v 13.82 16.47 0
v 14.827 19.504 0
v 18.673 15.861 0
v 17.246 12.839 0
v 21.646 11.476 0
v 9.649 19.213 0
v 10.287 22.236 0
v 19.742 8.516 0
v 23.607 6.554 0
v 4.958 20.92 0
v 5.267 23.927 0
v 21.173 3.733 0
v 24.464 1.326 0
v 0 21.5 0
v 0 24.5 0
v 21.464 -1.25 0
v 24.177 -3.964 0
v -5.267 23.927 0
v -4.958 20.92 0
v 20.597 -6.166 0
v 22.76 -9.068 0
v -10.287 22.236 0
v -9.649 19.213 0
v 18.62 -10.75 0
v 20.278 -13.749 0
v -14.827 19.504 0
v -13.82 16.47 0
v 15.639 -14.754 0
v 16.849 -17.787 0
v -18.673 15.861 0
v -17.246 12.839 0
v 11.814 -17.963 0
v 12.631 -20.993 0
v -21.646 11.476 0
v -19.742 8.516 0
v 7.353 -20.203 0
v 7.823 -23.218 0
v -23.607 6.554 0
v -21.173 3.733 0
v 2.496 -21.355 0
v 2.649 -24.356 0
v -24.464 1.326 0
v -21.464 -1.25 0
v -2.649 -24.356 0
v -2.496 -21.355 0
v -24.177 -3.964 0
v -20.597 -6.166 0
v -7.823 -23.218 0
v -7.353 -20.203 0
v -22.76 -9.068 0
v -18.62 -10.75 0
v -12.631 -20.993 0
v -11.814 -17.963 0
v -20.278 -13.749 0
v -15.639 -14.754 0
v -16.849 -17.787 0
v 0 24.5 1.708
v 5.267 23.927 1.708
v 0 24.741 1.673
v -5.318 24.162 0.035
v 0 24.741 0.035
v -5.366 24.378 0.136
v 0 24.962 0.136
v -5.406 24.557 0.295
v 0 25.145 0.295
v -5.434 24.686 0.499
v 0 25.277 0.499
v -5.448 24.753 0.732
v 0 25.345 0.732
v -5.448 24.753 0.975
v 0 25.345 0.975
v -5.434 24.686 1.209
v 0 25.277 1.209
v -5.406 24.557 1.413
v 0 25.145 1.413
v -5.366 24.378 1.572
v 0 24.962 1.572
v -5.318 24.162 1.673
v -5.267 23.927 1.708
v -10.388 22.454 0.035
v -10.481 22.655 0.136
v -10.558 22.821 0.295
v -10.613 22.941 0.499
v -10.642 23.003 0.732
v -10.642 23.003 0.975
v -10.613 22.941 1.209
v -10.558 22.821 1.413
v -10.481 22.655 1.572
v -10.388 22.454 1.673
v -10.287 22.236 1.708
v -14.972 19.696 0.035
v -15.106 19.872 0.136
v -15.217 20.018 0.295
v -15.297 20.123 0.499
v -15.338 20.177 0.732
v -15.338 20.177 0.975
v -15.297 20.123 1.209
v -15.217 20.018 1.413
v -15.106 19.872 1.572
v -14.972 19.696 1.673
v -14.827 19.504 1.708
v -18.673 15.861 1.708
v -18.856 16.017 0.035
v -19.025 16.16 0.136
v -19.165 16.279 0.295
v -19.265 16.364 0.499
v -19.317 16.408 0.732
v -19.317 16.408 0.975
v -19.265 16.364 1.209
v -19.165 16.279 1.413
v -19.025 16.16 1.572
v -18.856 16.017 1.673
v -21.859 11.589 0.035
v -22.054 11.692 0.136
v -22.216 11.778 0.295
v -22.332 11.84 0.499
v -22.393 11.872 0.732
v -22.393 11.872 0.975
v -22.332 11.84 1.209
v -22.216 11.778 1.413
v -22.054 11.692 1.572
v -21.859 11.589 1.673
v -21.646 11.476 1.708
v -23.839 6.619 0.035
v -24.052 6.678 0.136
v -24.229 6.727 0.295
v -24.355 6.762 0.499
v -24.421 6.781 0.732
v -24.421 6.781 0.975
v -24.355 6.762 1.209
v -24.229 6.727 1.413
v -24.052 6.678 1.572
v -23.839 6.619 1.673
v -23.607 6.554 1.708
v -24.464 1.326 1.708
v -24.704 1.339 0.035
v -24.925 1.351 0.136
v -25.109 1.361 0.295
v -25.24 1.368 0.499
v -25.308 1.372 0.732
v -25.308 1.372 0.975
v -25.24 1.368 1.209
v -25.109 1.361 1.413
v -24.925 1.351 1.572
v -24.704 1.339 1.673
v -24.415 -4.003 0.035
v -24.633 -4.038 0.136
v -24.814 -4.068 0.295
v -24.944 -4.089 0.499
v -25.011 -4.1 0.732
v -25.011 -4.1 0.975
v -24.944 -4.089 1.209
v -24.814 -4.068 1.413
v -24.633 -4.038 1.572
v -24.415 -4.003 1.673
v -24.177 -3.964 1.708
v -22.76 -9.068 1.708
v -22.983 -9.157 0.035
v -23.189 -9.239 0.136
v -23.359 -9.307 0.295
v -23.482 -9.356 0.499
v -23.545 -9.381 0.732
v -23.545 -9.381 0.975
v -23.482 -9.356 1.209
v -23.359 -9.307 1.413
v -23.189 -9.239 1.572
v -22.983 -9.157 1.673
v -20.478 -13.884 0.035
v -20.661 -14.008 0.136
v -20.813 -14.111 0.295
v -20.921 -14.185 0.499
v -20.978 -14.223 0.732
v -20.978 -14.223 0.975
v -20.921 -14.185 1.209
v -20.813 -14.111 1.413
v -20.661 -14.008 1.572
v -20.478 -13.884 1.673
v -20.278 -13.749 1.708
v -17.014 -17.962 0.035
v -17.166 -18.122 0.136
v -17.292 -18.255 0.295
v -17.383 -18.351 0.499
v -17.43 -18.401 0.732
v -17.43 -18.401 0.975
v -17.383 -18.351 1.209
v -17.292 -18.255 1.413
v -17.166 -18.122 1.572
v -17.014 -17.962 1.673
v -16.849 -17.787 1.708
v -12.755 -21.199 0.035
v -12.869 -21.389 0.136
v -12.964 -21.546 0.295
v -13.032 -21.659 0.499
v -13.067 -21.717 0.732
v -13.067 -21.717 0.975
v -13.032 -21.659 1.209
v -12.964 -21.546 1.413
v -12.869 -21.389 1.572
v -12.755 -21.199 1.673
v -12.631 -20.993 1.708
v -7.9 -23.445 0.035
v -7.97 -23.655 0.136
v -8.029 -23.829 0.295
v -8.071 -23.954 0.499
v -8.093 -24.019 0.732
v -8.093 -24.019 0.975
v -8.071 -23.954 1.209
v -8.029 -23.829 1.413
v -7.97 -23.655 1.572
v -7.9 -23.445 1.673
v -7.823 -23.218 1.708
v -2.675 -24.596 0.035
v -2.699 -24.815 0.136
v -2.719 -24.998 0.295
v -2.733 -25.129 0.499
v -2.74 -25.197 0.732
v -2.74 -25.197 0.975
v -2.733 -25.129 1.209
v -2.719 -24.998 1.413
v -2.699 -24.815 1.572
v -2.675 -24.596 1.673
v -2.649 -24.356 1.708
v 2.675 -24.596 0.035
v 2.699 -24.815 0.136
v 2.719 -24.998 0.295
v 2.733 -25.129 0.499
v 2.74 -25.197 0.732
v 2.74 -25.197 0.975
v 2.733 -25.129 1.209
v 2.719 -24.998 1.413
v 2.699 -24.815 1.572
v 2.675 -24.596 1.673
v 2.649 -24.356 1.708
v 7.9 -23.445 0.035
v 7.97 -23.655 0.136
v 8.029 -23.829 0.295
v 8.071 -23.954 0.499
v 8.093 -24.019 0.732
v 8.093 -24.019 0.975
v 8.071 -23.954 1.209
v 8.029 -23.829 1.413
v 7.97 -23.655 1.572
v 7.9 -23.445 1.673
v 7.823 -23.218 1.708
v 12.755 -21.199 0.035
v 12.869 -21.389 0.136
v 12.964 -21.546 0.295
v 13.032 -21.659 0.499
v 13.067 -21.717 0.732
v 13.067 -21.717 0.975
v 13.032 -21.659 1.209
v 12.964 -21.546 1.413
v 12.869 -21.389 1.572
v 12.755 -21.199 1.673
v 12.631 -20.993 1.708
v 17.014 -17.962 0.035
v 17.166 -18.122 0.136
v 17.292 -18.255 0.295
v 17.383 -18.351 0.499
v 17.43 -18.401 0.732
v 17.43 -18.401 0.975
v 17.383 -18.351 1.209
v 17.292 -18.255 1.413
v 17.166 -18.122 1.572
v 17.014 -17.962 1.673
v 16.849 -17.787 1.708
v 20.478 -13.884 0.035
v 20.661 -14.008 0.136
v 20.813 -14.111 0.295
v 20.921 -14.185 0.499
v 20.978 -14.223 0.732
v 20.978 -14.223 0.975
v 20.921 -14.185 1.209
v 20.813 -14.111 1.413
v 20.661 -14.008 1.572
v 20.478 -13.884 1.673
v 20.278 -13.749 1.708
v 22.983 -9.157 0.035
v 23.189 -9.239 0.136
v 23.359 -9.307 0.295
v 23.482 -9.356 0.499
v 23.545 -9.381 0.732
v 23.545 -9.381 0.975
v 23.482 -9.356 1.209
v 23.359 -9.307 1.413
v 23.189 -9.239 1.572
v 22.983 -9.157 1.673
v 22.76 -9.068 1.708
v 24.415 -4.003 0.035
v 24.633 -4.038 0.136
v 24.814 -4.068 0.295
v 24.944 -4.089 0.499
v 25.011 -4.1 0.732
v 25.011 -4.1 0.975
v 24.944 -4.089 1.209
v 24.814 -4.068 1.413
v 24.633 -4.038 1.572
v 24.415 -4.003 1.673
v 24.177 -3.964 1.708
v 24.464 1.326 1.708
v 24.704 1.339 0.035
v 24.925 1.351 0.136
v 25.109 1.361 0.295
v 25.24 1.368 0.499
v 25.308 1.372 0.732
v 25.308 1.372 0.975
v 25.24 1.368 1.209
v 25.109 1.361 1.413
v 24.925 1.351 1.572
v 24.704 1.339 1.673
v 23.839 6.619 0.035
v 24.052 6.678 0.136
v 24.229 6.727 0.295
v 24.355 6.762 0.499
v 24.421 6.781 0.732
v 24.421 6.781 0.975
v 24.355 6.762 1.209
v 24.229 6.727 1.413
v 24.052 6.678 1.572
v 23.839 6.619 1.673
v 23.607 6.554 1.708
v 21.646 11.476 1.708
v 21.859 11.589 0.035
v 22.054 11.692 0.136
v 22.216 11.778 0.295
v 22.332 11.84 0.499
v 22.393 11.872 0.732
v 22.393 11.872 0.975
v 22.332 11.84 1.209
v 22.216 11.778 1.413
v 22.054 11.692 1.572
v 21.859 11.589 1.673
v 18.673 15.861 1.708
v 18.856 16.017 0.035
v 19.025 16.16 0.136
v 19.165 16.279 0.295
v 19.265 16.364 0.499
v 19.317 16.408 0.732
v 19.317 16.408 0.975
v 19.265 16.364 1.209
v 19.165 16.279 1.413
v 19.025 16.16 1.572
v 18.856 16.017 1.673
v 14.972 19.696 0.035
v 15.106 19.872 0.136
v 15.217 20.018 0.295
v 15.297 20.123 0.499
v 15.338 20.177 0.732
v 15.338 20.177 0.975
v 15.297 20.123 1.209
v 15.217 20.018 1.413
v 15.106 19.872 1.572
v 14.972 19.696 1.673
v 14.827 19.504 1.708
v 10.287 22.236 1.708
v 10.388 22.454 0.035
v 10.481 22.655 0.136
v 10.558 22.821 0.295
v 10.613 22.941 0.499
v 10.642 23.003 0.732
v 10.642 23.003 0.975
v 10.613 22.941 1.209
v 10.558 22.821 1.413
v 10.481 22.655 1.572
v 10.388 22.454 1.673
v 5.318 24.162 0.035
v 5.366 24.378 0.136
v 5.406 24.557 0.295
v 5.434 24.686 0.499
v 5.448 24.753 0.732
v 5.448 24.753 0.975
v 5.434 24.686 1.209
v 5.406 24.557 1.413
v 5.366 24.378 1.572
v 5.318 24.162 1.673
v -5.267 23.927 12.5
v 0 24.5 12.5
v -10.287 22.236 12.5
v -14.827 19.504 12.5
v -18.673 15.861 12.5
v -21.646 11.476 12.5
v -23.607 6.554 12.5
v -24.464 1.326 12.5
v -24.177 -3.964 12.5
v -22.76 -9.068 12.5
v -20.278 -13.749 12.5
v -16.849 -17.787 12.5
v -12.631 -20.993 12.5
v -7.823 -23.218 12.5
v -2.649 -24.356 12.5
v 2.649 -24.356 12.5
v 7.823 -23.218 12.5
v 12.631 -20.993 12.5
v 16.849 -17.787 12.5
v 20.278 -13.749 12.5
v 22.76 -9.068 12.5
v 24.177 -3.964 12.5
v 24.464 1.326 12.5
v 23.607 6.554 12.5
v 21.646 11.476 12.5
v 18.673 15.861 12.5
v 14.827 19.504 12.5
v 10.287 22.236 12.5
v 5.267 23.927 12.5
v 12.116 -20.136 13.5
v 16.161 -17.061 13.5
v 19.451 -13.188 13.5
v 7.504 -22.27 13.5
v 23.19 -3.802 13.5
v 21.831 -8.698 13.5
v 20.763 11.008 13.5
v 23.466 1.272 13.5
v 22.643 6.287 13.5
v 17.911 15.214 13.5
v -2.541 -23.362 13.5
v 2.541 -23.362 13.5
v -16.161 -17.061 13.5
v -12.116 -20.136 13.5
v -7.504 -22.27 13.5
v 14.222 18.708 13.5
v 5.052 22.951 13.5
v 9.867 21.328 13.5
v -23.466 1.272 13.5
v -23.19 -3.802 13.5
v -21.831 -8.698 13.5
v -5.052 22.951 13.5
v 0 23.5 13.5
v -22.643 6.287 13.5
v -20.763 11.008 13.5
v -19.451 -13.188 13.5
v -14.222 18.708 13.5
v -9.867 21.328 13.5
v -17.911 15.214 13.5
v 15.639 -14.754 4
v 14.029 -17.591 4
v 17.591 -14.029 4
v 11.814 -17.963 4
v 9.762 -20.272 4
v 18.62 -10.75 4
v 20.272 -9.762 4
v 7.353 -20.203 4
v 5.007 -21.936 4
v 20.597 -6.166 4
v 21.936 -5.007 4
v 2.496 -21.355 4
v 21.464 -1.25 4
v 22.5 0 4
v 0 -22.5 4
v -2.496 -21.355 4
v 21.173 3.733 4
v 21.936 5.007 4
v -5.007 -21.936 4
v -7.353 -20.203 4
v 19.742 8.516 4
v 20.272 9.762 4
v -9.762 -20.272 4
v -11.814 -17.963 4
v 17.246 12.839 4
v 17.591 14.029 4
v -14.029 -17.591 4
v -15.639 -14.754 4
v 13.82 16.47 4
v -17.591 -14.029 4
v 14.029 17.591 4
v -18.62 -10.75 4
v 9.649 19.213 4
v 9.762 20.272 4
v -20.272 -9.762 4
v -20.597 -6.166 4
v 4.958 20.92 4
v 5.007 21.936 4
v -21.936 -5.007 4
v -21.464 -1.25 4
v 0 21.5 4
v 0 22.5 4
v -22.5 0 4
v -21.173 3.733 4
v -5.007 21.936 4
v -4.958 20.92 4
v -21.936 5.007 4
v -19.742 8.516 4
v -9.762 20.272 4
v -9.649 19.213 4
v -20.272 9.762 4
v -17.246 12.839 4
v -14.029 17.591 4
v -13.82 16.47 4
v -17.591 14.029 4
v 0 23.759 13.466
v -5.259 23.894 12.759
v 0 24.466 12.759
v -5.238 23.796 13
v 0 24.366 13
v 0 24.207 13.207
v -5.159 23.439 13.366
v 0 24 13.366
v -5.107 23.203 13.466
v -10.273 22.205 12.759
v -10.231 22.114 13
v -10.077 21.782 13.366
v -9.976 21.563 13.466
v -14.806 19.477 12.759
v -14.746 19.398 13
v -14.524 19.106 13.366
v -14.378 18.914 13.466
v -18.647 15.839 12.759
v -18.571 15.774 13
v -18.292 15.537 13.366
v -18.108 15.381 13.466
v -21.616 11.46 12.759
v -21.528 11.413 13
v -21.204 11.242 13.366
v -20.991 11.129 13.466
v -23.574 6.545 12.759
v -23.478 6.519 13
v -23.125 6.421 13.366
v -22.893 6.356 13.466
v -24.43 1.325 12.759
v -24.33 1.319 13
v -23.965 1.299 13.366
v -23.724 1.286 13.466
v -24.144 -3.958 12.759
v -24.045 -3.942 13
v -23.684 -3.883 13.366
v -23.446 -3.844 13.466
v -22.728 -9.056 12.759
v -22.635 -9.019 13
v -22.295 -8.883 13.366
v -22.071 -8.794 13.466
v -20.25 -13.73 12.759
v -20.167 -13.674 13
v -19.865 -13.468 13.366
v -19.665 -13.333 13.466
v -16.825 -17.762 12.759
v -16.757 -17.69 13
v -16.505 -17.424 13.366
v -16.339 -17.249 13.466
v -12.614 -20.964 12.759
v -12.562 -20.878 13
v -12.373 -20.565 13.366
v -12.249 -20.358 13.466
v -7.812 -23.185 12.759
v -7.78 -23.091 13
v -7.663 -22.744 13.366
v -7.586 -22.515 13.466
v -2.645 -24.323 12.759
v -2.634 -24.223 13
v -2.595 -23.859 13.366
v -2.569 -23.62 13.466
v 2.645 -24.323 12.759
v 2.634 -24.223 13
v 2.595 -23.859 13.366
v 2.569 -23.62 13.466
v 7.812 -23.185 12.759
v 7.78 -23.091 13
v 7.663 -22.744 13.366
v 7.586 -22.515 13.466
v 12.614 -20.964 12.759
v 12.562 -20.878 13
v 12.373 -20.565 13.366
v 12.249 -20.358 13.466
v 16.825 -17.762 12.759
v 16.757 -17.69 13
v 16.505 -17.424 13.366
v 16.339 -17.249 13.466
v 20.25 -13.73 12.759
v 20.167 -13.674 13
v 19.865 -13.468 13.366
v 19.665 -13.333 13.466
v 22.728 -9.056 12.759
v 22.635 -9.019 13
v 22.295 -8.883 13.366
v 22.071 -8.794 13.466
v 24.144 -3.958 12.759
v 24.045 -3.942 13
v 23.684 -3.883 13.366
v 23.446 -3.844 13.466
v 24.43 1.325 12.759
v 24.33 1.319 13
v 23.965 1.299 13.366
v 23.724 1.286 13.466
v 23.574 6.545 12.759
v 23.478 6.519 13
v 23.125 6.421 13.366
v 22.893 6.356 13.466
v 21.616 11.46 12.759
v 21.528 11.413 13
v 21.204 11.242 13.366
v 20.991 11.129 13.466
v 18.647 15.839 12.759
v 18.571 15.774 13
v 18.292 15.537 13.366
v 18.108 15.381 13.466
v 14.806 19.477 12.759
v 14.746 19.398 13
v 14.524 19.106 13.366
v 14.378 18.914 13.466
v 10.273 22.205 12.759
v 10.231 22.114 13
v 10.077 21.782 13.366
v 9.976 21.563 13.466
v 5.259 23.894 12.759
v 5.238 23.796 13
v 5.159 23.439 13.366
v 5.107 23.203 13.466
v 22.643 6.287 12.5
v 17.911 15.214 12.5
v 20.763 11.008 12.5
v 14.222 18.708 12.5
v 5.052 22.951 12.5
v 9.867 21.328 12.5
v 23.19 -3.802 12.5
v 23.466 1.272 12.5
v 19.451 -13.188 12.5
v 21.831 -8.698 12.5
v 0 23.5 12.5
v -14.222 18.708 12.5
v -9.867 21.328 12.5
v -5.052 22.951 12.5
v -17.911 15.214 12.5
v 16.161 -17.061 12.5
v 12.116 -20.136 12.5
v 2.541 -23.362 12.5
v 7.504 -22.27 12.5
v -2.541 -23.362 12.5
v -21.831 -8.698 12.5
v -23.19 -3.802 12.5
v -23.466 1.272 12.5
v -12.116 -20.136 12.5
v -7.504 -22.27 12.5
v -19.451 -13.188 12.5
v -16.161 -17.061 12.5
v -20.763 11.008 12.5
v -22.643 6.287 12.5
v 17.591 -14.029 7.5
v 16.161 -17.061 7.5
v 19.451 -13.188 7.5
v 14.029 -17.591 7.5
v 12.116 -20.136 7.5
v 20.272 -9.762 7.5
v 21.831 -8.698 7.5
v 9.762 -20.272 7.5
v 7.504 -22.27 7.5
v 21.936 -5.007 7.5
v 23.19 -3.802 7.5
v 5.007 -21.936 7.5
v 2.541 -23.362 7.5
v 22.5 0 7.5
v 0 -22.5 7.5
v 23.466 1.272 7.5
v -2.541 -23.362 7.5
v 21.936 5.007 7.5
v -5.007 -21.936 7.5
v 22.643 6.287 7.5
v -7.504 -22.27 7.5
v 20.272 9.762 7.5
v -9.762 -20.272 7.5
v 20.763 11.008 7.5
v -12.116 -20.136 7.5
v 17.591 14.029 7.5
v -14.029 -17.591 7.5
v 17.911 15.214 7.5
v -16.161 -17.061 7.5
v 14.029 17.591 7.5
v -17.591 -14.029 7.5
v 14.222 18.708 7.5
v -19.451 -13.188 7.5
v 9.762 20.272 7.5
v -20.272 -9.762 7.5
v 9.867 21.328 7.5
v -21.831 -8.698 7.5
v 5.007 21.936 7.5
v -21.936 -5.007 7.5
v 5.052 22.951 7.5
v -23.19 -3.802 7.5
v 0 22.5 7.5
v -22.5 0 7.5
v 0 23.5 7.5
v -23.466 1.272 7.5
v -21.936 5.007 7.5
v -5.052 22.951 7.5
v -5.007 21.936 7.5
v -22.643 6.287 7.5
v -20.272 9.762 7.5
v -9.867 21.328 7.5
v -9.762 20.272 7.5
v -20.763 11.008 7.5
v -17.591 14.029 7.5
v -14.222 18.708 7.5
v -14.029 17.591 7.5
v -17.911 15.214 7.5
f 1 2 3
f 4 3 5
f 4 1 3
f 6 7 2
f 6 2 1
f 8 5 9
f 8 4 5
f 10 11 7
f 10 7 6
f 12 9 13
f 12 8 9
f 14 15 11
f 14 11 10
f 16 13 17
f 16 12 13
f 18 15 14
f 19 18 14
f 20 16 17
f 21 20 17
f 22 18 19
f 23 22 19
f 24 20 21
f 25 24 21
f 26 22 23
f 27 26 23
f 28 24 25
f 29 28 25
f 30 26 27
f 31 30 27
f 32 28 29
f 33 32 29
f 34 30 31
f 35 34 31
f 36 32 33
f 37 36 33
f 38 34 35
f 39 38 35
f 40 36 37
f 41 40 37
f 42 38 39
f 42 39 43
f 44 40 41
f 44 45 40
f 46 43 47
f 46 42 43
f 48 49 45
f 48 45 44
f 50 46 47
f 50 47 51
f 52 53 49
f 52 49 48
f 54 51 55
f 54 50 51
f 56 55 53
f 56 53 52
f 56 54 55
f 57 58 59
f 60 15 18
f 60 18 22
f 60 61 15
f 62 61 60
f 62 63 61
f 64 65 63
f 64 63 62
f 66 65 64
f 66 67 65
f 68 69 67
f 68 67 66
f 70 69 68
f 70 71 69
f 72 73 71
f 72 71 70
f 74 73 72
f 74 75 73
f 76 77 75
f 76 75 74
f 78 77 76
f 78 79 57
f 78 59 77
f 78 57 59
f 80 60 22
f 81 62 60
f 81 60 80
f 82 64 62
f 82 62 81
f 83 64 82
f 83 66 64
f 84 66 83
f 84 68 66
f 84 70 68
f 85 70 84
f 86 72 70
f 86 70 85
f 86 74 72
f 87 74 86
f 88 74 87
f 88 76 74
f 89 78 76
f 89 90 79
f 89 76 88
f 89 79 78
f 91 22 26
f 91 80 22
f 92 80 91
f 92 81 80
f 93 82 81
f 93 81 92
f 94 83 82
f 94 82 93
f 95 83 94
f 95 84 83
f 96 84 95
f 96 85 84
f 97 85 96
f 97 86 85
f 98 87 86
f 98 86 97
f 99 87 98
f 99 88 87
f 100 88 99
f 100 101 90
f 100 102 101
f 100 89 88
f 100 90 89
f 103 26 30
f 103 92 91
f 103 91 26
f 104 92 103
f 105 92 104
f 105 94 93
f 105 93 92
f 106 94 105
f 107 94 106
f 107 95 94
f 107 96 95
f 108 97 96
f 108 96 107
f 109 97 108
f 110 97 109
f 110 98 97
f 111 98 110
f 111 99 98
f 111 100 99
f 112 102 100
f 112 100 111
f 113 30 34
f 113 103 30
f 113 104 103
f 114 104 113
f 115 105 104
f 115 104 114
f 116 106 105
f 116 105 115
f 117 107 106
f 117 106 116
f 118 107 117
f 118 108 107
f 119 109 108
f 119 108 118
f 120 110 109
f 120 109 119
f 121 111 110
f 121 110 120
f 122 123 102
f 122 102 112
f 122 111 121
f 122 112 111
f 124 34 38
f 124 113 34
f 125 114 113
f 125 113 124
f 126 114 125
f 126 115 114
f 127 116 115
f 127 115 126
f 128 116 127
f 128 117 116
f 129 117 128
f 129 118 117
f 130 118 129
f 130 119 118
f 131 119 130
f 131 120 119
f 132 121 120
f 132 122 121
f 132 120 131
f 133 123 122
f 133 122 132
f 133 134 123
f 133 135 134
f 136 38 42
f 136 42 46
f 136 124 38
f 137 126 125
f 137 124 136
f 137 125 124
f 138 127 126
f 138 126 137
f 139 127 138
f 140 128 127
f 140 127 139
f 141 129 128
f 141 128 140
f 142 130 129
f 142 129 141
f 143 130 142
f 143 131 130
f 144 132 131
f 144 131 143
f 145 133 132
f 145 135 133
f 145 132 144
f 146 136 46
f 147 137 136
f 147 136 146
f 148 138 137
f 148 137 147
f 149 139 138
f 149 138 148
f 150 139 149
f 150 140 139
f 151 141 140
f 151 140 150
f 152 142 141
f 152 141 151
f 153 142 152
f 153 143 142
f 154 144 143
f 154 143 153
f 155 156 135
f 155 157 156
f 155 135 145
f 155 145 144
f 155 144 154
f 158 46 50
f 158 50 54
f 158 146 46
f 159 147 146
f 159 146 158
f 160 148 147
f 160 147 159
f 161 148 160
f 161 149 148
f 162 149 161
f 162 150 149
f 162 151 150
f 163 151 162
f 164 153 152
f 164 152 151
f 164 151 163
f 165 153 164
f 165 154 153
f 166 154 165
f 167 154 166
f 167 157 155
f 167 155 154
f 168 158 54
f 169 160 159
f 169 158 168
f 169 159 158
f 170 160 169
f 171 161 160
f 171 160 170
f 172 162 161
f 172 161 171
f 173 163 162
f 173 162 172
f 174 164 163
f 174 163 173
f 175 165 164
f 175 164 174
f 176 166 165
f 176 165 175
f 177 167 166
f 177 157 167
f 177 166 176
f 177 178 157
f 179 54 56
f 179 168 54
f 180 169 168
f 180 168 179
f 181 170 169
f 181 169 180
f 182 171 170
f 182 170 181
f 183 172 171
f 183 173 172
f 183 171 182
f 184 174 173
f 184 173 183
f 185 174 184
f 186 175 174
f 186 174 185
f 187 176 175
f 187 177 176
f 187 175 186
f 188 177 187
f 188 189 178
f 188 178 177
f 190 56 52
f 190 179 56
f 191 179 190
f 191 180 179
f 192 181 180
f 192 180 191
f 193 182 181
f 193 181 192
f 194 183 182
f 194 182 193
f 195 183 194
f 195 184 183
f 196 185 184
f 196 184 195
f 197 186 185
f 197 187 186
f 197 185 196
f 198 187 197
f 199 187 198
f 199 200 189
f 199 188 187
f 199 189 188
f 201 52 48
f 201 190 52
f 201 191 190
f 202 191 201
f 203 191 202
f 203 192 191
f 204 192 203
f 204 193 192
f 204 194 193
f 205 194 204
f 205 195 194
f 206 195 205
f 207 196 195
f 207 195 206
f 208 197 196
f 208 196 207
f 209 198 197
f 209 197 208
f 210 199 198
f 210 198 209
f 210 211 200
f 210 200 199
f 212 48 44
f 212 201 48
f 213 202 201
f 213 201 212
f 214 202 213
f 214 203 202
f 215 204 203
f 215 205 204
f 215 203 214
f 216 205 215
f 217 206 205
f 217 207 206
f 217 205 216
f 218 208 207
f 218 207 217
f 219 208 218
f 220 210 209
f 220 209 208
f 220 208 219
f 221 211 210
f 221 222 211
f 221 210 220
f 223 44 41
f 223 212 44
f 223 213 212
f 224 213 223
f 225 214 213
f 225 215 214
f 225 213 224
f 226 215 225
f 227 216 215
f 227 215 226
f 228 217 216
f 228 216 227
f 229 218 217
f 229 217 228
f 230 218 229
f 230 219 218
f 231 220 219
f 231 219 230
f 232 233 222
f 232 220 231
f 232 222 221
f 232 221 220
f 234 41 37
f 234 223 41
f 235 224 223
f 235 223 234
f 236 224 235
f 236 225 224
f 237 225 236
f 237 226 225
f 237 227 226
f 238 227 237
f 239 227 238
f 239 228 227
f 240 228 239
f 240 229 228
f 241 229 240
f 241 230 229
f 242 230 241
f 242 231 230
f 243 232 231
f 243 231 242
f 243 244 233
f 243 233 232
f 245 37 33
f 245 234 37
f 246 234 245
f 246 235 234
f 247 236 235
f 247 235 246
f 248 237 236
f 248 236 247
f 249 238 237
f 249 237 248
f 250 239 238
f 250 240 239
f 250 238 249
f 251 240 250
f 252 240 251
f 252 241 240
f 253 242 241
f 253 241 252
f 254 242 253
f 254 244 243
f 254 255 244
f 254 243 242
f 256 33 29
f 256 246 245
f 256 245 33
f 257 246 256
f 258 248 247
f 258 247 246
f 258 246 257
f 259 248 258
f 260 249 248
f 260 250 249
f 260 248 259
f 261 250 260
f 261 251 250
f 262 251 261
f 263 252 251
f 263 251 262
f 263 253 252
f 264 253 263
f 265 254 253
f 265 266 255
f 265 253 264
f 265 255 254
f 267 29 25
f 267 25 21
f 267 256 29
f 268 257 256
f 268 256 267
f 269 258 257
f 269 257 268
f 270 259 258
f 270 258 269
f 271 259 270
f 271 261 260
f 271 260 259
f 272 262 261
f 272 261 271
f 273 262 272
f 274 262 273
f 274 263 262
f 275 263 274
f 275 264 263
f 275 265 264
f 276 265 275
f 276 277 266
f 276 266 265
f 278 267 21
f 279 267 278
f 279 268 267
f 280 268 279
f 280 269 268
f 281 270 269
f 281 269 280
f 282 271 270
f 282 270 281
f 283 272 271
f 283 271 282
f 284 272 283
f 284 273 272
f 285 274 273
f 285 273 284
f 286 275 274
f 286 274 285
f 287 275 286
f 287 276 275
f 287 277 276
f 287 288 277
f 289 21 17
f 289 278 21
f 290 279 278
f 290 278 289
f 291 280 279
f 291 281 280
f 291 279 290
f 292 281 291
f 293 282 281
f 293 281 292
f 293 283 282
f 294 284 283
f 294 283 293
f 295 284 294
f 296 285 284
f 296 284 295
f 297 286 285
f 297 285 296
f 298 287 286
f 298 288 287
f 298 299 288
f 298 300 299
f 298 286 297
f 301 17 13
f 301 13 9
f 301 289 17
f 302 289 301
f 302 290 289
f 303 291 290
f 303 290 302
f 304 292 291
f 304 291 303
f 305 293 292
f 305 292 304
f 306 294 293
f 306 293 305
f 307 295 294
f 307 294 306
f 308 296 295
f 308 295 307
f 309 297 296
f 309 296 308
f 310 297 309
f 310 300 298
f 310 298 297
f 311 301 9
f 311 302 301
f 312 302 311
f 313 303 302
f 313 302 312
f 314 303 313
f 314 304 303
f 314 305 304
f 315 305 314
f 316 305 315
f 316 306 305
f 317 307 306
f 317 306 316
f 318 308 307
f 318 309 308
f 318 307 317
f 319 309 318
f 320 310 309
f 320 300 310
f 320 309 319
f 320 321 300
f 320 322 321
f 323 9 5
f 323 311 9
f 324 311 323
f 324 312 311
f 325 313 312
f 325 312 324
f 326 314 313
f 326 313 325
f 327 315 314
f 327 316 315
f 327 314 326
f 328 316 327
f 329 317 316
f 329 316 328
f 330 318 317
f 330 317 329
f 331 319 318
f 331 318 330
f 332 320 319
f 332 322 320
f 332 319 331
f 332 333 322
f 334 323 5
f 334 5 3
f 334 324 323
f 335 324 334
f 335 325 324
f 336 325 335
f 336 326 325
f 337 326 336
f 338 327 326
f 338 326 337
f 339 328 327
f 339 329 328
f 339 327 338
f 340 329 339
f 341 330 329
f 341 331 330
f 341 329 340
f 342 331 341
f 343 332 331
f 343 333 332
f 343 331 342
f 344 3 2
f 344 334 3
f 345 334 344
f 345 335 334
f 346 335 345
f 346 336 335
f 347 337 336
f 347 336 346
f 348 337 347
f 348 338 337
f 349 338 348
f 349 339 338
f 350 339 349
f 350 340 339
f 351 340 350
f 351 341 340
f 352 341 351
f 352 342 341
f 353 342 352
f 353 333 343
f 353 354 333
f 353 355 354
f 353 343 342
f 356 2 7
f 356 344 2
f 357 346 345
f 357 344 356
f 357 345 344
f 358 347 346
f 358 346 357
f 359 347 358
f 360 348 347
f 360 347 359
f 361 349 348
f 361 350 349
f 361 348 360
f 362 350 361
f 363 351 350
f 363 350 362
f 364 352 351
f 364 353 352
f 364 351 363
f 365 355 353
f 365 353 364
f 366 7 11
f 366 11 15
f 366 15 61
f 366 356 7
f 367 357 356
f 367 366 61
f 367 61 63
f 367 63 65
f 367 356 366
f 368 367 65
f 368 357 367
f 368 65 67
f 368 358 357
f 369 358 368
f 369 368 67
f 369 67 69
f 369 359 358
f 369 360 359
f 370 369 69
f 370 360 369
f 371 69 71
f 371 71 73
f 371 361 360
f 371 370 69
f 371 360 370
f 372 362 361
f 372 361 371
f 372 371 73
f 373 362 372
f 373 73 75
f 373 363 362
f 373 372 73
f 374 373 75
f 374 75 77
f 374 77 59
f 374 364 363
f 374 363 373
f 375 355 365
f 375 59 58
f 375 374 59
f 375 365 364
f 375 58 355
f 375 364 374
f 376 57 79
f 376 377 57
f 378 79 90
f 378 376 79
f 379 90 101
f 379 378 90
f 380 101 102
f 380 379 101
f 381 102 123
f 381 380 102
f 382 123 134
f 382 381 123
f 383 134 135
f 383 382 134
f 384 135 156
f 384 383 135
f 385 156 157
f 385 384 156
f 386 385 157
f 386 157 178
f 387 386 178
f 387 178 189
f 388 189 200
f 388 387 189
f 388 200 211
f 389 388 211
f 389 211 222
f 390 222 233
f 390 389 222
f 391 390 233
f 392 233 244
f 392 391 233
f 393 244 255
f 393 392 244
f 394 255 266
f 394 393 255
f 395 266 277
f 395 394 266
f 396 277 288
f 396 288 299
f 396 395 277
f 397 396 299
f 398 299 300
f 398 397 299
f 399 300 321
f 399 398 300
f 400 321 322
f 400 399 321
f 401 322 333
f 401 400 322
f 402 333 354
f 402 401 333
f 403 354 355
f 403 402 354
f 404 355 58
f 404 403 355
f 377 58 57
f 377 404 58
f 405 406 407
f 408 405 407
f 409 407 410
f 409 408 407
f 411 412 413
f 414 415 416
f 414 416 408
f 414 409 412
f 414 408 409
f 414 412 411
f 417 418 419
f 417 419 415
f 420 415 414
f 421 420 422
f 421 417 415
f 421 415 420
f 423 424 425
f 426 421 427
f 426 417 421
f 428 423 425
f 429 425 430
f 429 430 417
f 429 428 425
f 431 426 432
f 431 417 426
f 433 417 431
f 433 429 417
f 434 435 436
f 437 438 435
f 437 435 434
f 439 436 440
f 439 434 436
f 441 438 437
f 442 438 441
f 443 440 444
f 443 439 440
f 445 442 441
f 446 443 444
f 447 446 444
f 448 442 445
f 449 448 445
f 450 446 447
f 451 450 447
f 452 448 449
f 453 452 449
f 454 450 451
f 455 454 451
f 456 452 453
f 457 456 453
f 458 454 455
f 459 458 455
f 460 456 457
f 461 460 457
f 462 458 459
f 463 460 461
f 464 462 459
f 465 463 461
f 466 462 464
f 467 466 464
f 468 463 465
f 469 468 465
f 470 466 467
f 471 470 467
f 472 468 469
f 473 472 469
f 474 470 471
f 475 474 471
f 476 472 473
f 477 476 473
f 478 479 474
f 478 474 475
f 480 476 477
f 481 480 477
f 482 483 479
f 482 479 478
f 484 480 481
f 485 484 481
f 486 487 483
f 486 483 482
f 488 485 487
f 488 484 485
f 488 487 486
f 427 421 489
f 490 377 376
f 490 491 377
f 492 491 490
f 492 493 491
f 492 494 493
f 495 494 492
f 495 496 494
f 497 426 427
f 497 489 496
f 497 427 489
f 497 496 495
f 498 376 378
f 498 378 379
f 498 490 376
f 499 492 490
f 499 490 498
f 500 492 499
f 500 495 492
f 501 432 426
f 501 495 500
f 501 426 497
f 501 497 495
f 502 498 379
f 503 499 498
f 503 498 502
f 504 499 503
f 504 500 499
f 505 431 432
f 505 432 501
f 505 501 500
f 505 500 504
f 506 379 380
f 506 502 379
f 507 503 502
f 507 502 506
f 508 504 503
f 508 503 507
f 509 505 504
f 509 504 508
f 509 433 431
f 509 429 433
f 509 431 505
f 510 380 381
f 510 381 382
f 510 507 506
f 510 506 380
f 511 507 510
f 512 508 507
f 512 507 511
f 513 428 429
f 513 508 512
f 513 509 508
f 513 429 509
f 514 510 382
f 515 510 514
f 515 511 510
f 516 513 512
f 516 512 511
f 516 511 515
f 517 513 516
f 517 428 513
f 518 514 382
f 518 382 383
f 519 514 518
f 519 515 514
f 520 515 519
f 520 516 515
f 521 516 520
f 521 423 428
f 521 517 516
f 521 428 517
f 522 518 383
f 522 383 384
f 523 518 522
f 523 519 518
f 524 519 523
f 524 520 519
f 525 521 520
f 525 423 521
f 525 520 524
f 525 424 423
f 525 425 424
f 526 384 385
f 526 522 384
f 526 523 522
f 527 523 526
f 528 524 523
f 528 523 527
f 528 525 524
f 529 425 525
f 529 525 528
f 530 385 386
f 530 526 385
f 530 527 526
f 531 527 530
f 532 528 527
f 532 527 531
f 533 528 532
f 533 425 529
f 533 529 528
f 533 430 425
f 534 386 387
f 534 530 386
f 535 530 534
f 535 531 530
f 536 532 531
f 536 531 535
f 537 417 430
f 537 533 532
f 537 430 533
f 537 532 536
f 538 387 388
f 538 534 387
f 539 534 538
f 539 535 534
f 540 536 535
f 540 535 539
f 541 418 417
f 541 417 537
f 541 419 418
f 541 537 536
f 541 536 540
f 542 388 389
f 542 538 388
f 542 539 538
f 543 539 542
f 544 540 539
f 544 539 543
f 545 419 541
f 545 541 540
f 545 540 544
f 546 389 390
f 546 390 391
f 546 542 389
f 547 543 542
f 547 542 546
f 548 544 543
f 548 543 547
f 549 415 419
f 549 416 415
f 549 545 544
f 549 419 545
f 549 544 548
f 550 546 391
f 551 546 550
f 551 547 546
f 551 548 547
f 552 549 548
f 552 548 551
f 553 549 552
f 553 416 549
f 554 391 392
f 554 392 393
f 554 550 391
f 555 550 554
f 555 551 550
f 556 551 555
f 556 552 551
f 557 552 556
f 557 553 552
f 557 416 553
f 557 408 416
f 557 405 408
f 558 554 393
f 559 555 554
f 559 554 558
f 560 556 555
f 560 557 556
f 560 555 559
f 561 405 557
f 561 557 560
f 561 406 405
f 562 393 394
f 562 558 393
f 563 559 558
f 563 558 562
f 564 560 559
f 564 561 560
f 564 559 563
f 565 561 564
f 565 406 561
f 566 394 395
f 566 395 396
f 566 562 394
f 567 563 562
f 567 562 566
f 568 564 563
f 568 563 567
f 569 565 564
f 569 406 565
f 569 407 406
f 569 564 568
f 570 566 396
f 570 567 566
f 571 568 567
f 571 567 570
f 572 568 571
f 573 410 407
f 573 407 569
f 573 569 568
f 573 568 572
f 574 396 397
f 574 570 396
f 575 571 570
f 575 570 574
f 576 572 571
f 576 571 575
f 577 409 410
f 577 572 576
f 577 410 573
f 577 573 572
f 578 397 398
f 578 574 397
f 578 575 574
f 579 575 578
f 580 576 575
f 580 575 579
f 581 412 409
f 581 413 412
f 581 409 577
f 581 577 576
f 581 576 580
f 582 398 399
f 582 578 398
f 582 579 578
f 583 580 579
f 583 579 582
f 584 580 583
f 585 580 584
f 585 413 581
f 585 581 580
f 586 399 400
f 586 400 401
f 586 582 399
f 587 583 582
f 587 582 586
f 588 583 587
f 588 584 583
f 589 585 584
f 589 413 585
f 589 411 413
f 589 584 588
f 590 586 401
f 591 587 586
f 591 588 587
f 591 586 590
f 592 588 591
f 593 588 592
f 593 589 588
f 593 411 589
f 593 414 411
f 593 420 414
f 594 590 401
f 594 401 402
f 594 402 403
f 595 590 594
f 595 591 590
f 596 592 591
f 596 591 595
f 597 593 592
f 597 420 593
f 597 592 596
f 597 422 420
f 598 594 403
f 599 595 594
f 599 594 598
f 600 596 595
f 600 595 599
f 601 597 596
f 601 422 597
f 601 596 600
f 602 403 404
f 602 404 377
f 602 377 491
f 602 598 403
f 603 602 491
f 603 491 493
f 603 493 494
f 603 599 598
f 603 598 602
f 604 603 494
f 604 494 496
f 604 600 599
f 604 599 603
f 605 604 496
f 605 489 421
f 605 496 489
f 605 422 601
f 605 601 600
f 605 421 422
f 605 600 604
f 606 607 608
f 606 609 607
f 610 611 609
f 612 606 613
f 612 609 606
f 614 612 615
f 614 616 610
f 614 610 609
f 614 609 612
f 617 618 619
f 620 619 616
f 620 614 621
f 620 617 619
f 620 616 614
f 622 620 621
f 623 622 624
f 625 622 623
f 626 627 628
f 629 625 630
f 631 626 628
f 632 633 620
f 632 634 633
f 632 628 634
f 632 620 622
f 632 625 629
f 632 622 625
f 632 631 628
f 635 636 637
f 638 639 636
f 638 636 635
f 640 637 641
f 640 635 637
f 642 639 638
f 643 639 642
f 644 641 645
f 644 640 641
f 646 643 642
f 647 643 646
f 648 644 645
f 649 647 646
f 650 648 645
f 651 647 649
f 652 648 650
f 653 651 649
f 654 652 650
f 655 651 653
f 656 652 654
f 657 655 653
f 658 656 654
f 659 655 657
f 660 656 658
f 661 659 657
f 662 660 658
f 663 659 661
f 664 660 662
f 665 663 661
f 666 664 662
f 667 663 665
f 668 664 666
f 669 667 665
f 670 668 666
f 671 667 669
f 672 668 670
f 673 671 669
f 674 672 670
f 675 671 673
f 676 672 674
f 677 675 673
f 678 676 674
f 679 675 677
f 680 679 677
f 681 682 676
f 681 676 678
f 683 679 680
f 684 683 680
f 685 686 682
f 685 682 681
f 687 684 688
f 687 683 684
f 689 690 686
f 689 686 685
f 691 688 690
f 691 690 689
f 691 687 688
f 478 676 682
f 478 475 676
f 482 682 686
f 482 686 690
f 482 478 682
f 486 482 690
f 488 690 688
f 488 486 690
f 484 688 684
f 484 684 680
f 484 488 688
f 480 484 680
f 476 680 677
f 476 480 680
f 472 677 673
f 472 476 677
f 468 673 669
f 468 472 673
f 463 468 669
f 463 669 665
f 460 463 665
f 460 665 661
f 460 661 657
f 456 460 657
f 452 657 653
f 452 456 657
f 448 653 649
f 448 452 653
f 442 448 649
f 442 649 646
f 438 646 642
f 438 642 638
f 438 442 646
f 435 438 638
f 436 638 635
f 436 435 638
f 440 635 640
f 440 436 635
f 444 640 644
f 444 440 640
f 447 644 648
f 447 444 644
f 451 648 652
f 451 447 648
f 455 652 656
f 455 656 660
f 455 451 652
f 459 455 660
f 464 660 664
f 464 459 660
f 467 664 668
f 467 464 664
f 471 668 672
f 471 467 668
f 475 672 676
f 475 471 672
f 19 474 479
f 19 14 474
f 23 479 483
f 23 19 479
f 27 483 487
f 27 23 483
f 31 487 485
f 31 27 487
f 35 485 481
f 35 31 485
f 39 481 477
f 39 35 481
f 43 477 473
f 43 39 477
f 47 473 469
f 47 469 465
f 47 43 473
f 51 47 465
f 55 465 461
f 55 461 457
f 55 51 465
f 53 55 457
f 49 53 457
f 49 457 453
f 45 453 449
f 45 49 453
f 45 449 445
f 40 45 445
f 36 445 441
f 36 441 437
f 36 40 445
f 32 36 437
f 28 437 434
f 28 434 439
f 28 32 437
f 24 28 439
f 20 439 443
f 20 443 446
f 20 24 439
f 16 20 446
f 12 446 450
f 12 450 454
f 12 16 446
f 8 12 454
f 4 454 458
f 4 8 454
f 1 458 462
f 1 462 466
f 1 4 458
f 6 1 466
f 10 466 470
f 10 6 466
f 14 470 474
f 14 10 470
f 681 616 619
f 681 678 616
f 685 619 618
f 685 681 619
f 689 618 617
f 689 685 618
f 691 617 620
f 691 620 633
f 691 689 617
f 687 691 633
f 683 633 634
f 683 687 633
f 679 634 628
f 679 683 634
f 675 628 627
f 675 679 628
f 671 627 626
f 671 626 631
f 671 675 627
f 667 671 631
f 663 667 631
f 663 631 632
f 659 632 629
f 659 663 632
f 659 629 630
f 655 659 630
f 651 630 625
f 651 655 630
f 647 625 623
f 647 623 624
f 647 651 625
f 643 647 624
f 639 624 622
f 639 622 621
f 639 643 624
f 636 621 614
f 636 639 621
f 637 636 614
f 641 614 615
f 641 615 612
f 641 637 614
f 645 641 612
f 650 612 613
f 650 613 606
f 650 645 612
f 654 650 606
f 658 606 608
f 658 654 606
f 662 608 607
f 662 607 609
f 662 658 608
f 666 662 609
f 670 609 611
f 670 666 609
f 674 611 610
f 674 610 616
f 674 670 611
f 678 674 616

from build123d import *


# Not quite as in the source:
# - a feature names something its author has since deleted; it is built from what else it names


with BuildPart() as f1:
    # F0 (on Right) → F1 (revolve)
    with BuildSketch(Plane.YZ):
        with BuildLine():
            Line((21.5, 4), (21.5, 0))
            Line((21.5, 0), (24.5, 0))
            Line((24.5, 0), (24.5, 1.7079167301))
            Line((24.5, 1.7079167301), (24.5, 12.5))
            ThreePointArc((24.5, 12.5), (24.2071067812, 13.2071067812), (23.5, 13.5))
            Line((23.5, 13.5), (0, 13.5))
            Line((0, 13.5), (0, 12.5))
            Line((0, 12.5), (22.5, 12.5))
            Line((22.5, 12.5), (23.5, 12.5))
            Line((23.5, 12.5), (23.5, 7.5))
            Line((23.5, 7.5), (22.5, 7.5))
            Line((22.5, 7.5), (22.5, 4))
            Line((22.5, 4), (21.5, 4))
        make_face()
        with BuildLine():
            Line((24.5, 1.7079167301), (24.5, 0))
            ThreePointArc((24.5, 0), (25.353958365, 0.853958365), (24.5, 1.7079167301))
        make_face()
    revolve(axis=Axis((0, 0, 6.75), (0, 0, 1)))


solid = f1.part
